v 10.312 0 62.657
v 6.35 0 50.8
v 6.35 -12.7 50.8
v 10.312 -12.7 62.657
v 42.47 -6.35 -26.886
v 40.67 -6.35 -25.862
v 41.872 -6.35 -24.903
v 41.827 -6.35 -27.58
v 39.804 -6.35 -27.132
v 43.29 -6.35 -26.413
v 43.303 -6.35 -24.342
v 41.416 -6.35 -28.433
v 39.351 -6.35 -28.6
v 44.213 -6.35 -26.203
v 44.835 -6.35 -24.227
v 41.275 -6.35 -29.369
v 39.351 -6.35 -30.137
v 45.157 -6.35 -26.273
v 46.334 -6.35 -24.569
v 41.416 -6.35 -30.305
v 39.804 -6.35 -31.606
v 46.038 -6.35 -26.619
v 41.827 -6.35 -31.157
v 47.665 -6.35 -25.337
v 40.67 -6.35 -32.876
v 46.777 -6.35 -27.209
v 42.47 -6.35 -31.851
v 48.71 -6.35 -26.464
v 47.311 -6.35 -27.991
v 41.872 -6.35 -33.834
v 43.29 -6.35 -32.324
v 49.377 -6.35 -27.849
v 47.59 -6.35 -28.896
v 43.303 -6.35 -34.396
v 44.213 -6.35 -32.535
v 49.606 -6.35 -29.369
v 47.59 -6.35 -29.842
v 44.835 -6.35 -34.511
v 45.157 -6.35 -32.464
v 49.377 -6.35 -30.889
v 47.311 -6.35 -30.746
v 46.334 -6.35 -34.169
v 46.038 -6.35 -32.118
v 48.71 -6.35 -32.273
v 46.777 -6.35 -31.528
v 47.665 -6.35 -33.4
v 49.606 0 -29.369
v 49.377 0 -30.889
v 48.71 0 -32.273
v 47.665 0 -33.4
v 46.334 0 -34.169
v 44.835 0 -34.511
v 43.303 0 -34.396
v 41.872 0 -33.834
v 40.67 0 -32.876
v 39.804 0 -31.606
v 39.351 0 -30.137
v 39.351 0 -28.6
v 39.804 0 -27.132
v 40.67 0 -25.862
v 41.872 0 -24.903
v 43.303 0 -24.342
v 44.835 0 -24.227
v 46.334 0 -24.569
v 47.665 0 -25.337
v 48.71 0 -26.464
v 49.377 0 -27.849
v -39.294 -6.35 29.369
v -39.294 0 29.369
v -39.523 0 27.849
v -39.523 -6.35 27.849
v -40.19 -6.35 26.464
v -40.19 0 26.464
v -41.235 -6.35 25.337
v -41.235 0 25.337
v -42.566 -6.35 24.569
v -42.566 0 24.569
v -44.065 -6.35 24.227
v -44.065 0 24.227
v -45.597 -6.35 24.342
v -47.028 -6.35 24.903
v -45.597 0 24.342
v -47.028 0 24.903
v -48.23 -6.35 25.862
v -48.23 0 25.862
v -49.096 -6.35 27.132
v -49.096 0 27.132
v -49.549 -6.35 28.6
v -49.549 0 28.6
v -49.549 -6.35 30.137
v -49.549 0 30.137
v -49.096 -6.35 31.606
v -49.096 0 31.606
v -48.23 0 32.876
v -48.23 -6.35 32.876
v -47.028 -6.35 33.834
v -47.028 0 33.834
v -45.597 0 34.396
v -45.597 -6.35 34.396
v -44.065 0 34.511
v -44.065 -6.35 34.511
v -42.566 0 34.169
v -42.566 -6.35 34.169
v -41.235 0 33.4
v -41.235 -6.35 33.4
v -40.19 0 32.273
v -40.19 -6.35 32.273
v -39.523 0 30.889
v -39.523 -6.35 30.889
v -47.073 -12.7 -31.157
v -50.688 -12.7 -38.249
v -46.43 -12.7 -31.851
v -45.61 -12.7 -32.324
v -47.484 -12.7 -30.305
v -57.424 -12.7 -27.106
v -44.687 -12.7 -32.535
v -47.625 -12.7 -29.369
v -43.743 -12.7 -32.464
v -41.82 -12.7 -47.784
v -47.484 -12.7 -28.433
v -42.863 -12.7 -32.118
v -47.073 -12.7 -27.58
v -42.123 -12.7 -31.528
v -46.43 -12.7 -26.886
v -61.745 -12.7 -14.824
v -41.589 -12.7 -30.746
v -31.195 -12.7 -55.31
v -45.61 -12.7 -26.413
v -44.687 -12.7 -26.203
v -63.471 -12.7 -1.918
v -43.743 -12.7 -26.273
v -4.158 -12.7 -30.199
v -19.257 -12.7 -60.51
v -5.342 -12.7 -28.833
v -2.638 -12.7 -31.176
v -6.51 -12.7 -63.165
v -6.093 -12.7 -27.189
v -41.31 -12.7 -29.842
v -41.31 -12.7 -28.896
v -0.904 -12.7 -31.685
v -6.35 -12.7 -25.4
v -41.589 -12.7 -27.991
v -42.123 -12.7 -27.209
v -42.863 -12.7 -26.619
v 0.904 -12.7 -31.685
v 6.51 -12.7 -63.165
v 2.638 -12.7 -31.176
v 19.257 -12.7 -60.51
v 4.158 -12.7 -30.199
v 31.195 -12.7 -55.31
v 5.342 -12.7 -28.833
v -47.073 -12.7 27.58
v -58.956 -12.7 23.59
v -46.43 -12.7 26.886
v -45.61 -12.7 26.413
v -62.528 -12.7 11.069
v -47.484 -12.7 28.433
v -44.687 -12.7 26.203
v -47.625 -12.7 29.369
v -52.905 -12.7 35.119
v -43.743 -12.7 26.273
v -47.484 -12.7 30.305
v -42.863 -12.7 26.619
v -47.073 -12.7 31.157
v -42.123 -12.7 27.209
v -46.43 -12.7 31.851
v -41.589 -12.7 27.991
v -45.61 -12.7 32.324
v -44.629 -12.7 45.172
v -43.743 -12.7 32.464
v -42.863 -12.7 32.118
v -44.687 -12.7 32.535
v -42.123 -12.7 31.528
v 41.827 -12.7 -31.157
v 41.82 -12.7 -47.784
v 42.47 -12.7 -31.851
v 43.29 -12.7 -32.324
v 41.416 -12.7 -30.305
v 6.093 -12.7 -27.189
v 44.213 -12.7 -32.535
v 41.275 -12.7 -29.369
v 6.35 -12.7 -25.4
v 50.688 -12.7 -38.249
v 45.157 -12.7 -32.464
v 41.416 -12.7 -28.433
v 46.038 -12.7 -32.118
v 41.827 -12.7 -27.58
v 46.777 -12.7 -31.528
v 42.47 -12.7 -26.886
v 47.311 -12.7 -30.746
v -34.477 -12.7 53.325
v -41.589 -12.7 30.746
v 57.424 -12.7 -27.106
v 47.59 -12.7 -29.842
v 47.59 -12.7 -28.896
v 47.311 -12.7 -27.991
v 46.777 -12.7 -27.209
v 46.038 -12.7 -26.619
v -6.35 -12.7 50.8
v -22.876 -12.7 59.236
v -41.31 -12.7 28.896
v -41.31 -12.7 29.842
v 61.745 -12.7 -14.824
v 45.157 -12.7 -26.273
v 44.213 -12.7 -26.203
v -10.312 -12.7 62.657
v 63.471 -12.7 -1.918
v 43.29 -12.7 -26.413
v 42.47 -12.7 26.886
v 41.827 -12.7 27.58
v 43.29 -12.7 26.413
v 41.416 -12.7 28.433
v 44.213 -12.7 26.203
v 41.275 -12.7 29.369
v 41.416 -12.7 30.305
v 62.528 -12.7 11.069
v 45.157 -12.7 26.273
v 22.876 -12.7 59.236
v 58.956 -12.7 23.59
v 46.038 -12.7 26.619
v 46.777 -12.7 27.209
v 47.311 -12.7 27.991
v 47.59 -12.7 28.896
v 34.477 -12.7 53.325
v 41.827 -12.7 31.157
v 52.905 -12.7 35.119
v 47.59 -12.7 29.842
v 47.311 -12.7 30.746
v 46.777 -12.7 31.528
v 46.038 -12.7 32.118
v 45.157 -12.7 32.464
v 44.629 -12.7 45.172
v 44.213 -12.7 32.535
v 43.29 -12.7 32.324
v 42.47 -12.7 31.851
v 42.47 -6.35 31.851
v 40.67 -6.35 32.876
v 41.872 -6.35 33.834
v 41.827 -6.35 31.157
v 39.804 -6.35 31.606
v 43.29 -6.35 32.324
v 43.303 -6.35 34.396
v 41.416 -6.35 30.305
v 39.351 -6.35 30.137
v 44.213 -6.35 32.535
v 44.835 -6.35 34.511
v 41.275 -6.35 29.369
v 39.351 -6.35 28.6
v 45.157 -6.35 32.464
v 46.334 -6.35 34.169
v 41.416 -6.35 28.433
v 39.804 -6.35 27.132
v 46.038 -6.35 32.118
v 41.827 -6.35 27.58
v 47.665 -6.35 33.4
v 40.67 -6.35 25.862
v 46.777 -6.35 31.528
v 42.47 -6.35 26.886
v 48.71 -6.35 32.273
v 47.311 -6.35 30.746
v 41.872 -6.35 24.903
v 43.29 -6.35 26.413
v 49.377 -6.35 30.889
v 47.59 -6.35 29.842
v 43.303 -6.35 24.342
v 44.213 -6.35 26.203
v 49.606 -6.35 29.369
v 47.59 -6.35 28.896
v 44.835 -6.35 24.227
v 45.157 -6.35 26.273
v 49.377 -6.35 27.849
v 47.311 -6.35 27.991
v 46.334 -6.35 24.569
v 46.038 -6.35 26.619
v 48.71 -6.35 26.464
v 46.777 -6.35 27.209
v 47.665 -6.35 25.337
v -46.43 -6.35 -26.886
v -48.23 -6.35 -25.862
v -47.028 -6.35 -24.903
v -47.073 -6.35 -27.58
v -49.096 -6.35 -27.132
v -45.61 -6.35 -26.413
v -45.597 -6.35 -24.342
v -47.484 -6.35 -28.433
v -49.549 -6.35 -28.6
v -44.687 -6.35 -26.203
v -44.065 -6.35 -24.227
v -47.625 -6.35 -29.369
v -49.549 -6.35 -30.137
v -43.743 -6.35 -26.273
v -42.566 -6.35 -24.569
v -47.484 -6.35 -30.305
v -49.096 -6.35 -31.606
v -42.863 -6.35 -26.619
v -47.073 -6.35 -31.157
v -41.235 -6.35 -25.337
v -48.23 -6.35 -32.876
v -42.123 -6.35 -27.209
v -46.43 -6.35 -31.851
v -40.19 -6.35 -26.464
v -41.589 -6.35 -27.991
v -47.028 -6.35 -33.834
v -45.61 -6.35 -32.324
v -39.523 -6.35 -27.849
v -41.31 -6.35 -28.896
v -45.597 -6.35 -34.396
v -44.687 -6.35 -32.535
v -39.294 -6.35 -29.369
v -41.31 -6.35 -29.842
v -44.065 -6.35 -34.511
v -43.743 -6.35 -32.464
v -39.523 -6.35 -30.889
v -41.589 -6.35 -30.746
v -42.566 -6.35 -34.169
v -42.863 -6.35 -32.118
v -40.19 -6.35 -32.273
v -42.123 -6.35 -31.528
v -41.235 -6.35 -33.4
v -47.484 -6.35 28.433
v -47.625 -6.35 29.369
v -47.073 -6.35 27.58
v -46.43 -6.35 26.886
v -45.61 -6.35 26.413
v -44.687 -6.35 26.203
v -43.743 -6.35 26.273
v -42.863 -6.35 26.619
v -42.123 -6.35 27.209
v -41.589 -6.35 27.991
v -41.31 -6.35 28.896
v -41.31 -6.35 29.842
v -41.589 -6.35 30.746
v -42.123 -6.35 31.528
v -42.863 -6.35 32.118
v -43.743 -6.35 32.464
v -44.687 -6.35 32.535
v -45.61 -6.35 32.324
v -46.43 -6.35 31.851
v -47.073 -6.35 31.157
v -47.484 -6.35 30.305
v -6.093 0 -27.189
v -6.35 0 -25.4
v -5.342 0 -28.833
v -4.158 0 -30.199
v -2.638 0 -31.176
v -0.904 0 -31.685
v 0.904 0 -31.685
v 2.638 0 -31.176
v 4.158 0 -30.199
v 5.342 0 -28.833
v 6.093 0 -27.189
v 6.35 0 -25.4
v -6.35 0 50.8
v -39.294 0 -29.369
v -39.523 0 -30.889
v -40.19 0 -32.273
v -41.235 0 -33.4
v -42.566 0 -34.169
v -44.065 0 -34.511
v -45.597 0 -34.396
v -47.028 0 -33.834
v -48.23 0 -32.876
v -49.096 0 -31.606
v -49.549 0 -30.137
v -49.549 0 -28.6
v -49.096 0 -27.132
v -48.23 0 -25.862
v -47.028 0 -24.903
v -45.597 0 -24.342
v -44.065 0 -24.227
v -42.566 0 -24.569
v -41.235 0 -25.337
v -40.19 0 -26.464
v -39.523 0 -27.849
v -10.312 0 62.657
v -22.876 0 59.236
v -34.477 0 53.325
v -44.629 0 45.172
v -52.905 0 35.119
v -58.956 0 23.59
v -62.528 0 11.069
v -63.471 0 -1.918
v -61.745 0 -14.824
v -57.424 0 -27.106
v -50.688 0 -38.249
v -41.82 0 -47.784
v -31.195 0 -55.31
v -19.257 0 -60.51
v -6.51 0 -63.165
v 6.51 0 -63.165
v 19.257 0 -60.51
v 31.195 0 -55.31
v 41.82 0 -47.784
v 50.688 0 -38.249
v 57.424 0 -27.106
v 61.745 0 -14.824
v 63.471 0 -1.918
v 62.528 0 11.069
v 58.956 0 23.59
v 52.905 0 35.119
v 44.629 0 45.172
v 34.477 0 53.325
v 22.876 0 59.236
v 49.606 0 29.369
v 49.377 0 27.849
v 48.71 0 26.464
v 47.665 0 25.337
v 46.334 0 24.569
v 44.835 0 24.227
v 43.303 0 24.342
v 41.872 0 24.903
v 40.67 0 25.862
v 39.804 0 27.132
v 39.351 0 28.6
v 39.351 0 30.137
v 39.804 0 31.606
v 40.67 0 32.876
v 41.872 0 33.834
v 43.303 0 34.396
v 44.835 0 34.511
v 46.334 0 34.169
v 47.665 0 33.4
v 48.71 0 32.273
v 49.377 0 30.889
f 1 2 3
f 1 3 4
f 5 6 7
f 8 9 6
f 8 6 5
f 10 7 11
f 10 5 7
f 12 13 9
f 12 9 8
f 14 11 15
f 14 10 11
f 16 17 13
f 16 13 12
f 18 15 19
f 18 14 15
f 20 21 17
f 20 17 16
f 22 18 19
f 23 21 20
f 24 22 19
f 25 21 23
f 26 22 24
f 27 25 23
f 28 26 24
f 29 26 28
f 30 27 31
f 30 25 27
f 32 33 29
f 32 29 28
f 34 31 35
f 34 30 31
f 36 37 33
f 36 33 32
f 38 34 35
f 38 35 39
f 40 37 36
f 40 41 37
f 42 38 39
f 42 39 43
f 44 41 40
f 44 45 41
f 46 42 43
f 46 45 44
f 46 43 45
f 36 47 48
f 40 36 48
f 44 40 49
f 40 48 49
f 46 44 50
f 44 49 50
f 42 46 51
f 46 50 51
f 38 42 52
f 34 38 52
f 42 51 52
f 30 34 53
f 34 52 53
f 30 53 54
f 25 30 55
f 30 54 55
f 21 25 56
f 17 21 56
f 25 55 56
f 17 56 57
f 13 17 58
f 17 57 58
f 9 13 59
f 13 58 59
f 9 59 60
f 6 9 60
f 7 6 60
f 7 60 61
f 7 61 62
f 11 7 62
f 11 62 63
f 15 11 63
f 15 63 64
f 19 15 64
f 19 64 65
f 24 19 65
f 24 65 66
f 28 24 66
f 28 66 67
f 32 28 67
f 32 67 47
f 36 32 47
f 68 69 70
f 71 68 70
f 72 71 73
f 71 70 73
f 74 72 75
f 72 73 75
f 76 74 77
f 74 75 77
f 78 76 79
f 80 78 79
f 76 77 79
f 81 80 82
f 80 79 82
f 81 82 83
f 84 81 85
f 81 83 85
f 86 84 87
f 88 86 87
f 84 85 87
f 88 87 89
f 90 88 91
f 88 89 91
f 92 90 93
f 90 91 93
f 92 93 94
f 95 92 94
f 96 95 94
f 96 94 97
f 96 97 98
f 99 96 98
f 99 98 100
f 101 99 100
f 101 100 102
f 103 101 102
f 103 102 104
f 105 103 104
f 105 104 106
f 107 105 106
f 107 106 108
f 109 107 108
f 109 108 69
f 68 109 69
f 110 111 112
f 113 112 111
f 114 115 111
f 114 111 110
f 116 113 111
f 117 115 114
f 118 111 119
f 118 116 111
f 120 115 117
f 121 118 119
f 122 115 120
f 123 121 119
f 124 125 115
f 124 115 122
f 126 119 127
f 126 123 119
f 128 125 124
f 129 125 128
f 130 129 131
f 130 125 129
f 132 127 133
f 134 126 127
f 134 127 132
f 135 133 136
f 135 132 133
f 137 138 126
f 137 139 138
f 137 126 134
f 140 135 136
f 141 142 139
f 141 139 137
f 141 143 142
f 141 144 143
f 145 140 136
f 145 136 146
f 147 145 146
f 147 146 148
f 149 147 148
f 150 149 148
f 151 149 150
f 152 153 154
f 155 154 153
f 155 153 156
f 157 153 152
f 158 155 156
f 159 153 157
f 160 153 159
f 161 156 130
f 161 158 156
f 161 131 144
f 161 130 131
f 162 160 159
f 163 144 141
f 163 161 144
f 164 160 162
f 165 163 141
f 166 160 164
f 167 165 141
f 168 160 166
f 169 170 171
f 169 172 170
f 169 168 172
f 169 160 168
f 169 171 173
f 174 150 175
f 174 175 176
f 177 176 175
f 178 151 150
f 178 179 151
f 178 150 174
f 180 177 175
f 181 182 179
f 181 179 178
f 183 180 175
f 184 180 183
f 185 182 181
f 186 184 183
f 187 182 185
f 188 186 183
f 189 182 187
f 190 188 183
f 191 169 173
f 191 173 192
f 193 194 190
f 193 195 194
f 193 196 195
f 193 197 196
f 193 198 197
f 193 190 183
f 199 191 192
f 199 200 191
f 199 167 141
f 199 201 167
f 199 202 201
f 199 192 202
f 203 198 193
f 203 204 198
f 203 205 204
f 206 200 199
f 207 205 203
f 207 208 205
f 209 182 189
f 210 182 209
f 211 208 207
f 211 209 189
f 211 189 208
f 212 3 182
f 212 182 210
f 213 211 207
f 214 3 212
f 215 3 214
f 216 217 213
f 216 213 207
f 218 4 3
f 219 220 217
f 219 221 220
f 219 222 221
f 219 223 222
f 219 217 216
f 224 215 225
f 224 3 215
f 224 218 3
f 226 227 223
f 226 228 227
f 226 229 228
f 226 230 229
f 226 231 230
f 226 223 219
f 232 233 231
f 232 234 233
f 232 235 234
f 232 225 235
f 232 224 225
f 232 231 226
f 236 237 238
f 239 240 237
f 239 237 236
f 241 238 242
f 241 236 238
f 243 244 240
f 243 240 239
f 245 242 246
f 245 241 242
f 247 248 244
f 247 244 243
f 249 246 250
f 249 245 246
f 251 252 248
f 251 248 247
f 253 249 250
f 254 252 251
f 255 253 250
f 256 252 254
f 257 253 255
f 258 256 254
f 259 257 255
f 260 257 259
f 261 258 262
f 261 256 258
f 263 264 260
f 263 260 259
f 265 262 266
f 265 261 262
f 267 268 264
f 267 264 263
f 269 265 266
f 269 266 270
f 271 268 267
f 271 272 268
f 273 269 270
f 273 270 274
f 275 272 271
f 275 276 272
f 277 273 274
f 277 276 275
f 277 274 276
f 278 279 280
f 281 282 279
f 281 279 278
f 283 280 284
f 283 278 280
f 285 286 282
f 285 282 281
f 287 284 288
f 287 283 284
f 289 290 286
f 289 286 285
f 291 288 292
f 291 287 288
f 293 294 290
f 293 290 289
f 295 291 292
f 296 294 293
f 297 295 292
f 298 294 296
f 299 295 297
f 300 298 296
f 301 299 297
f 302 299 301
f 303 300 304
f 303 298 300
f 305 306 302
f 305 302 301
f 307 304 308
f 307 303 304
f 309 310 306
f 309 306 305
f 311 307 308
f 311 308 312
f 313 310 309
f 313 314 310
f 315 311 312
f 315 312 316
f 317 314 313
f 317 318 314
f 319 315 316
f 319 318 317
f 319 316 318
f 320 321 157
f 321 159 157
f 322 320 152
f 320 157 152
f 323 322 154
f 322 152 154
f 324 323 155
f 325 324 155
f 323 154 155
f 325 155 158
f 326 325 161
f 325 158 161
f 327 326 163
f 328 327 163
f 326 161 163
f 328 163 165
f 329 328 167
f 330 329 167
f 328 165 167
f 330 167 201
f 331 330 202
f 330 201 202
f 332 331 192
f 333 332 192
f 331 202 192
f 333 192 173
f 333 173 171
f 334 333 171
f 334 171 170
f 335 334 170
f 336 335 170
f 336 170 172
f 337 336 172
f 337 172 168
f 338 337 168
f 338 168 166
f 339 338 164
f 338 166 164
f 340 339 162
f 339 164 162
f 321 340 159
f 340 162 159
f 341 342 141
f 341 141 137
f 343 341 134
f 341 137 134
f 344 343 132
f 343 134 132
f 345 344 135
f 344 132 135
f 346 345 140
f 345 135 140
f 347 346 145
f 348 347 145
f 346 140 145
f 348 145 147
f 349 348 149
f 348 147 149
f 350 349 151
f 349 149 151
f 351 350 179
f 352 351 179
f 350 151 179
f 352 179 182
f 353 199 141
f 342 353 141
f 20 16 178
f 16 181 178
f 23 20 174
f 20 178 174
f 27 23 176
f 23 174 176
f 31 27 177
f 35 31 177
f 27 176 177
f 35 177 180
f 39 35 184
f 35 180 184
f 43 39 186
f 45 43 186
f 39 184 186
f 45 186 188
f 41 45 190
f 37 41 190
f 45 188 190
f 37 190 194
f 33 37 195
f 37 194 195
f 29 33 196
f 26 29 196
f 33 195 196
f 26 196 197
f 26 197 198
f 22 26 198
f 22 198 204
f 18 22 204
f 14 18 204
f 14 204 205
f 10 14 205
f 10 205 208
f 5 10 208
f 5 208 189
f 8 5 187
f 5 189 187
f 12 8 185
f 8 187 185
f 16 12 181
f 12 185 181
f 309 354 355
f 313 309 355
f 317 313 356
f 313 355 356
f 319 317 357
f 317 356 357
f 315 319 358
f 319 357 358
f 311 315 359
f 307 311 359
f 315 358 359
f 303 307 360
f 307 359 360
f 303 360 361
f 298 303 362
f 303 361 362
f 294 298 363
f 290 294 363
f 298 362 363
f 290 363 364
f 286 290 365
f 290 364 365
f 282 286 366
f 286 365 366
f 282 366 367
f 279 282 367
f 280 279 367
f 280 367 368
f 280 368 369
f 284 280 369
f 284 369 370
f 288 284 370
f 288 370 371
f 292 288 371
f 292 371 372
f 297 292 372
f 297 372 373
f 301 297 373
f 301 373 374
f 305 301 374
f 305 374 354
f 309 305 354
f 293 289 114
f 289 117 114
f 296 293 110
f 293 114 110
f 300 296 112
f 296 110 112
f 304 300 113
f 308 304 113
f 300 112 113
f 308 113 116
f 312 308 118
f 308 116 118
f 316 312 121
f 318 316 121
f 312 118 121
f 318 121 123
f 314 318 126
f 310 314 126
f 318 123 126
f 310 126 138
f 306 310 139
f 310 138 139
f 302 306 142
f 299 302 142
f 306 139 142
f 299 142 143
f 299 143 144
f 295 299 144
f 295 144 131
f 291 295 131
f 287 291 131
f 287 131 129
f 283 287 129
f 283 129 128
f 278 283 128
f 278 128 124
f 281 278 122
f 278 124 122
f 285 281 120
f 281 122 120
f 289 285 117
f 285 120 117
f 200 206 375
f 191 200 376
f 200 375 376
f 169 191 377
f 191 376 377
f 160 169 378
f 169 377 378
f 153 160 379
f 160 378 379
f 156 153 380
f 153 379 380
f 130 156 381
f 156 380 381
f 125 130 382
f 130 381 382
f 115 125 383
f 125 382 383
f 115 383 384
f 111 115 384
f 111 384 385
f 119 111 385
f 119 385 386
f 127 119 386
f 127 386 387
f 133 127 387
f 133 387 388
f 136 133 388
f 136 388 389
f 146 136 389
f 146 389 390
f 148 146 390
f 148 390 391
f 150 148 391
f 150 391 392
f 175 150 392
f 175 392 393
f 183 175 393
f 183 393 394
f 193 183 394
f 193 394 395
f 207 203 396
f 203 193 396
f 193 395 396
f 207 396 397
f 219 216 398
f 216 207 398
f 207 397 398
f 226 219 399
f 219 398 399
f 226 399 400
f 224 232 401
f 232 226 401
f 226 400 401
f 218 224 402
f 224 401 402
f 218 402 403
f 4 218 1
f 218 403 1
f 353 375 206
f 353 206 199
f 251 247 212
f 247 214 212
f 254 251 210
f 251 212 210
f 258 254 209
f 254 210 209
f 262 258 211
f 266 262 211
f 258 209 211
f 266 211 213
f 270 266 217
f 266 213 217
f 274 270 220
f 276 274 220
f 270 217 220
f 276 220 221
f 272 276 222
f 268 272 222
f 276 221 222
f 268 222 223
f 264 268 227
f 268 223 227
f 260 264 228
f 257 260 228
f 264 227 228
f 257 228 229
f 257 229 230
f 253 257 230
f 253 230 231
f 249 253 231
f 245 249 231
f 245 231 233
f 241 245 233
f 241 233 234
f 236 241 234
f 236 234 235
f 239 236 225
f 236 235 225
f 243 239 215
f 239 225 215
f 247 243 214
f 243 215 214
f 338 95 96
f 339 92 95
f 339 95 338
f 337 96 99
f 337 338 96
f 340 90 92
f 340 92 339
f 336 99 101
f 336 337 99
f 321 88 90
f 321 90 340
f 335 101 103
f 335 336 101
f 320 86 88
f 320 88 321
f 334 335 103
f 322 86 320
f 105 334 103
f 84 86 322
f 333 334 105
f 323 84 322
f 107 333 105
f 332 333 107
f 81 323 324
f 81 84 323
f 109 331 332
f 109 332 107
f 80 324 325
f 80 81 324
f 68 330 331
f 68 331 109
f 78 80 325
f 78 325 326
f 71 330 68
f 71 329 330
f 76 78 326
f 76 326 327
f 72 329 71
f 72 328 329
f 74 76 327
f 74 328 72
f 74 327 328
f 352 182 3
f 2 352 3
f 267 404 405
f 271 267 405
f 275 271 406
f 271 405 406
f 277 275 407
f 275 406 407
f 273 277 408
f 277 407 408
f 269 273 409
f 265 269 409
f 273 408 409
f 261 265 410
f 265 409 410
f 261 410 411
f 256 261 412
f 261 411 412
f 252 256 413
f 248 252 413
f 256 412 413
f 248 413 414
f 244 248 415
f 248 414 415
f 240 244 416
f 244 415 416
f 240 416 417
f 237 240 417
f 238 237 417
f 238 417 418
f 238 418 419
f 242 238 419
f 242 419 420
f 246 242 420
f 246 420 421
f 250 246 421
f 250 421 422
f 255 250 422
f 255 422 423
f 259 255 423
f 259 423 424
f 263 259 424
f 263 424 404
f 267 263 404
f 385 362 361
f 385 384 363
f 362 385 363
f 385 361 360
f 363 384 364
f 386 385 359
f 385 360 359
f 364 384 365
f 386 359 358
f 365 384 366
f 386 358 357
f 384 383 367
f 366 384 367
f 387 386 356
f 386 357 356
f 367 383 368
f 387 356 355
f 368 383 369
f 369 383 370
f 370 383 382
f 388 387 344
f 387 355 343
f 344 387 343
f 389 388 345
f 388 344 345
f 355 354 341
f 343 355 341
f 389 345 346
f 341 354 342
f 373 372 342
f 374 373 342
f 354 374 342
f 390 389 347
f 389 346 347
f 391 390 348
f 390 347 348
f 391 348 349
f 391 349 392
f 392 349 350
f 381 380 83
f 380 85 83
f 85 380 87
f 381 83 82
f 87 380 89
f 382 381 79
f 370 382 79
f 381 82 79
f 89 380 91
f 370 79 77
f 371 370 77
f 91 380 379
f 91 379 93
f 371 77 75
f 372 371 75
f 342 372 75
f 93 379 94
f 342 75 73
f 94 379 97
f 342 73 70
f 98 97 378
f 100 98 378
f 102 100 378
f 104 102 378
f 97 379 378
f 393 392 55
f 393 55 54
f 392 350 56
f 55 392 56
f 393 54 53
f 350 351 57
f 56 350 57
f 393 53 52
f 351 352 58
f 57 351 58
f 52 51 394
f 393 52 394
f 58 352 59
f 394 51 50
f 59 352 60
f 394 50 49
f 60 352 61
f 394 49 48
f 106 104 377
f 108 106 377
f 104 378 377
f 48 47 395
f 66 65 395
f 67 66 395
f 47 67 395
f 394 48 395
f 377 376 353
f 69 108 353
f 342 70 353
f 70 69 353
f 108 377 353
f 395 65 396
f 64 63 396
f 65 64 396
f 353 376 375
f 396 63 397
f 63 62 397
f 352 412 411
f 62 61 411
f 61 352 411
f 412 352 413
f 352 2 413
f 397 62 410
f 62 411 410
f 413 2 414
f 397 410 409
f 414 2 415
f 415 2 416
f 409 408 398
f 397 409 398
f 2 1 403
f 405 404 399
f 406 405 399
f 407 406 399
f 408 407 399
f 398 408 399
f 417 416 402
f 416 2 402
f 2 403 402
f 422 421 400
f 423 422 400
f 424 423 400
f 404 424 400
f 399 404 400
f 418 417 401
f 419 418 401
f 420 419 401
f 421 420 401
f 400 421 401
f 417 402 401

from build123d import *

# Parameters (mm, degrees)
F0_R           = 63.5
F1_DEPTH       = 12.7
F3_DEPTH       = 25.4
F4_D           = 6.35
F4_CBORE_D     = 10.3124
F4_CBORE_DEPTH = 6.35


# Not quite as in the source:
# - a feature names something its author has since deleted; it is built from what else it names


with BuildPart() as f1:
    # F0 (on Front) → F1 (new body)
    with BuildSketch(Plane.XZ):
        Circle(F0_R)
    extrude(amount=F1_DEPTH)

    # F2 (on face) → F3 (cut)
    with BuildSketch(Plane.XZ.offset(12.7)):
        with BuildLine():
            Line((-10.3124, 62.6570379625), (-6.35, 50.8))
            Line((-6.35, 50.8), (-6.35, -25.4))
            ThreePointArc((-6.35, -25.4), (0, -31.75), (6.35, -25.4))
            Line((6.35, -25.4), (6.35, 50.8))
            Line((6.35, 50.8), (10.3124, 62.6570379625))
            ThreePointArc((10.3124, 62.6570379625), (0, 63.5), (-10.3124, 62.6570379625))
        make_face()
    extrude(amount=-F3_DEPTH, mode=Mode.SUBTRACT)

    # F4 (through all)
    with Locations(Plane(origin=(0, 0, 0), x_dir=(1, 0, 0), z_dir=(0, 1, 0))):
        with Locations((44.45, -29.36875), (-44.45, -29.36875), (44.45, 29.36875), (-44.45, 29.36875)):
            CounterBoreHole(F4_D / 2, F4_CBORE_D / 2, F4_CBORE_DEPTH)


solid = f1.part
